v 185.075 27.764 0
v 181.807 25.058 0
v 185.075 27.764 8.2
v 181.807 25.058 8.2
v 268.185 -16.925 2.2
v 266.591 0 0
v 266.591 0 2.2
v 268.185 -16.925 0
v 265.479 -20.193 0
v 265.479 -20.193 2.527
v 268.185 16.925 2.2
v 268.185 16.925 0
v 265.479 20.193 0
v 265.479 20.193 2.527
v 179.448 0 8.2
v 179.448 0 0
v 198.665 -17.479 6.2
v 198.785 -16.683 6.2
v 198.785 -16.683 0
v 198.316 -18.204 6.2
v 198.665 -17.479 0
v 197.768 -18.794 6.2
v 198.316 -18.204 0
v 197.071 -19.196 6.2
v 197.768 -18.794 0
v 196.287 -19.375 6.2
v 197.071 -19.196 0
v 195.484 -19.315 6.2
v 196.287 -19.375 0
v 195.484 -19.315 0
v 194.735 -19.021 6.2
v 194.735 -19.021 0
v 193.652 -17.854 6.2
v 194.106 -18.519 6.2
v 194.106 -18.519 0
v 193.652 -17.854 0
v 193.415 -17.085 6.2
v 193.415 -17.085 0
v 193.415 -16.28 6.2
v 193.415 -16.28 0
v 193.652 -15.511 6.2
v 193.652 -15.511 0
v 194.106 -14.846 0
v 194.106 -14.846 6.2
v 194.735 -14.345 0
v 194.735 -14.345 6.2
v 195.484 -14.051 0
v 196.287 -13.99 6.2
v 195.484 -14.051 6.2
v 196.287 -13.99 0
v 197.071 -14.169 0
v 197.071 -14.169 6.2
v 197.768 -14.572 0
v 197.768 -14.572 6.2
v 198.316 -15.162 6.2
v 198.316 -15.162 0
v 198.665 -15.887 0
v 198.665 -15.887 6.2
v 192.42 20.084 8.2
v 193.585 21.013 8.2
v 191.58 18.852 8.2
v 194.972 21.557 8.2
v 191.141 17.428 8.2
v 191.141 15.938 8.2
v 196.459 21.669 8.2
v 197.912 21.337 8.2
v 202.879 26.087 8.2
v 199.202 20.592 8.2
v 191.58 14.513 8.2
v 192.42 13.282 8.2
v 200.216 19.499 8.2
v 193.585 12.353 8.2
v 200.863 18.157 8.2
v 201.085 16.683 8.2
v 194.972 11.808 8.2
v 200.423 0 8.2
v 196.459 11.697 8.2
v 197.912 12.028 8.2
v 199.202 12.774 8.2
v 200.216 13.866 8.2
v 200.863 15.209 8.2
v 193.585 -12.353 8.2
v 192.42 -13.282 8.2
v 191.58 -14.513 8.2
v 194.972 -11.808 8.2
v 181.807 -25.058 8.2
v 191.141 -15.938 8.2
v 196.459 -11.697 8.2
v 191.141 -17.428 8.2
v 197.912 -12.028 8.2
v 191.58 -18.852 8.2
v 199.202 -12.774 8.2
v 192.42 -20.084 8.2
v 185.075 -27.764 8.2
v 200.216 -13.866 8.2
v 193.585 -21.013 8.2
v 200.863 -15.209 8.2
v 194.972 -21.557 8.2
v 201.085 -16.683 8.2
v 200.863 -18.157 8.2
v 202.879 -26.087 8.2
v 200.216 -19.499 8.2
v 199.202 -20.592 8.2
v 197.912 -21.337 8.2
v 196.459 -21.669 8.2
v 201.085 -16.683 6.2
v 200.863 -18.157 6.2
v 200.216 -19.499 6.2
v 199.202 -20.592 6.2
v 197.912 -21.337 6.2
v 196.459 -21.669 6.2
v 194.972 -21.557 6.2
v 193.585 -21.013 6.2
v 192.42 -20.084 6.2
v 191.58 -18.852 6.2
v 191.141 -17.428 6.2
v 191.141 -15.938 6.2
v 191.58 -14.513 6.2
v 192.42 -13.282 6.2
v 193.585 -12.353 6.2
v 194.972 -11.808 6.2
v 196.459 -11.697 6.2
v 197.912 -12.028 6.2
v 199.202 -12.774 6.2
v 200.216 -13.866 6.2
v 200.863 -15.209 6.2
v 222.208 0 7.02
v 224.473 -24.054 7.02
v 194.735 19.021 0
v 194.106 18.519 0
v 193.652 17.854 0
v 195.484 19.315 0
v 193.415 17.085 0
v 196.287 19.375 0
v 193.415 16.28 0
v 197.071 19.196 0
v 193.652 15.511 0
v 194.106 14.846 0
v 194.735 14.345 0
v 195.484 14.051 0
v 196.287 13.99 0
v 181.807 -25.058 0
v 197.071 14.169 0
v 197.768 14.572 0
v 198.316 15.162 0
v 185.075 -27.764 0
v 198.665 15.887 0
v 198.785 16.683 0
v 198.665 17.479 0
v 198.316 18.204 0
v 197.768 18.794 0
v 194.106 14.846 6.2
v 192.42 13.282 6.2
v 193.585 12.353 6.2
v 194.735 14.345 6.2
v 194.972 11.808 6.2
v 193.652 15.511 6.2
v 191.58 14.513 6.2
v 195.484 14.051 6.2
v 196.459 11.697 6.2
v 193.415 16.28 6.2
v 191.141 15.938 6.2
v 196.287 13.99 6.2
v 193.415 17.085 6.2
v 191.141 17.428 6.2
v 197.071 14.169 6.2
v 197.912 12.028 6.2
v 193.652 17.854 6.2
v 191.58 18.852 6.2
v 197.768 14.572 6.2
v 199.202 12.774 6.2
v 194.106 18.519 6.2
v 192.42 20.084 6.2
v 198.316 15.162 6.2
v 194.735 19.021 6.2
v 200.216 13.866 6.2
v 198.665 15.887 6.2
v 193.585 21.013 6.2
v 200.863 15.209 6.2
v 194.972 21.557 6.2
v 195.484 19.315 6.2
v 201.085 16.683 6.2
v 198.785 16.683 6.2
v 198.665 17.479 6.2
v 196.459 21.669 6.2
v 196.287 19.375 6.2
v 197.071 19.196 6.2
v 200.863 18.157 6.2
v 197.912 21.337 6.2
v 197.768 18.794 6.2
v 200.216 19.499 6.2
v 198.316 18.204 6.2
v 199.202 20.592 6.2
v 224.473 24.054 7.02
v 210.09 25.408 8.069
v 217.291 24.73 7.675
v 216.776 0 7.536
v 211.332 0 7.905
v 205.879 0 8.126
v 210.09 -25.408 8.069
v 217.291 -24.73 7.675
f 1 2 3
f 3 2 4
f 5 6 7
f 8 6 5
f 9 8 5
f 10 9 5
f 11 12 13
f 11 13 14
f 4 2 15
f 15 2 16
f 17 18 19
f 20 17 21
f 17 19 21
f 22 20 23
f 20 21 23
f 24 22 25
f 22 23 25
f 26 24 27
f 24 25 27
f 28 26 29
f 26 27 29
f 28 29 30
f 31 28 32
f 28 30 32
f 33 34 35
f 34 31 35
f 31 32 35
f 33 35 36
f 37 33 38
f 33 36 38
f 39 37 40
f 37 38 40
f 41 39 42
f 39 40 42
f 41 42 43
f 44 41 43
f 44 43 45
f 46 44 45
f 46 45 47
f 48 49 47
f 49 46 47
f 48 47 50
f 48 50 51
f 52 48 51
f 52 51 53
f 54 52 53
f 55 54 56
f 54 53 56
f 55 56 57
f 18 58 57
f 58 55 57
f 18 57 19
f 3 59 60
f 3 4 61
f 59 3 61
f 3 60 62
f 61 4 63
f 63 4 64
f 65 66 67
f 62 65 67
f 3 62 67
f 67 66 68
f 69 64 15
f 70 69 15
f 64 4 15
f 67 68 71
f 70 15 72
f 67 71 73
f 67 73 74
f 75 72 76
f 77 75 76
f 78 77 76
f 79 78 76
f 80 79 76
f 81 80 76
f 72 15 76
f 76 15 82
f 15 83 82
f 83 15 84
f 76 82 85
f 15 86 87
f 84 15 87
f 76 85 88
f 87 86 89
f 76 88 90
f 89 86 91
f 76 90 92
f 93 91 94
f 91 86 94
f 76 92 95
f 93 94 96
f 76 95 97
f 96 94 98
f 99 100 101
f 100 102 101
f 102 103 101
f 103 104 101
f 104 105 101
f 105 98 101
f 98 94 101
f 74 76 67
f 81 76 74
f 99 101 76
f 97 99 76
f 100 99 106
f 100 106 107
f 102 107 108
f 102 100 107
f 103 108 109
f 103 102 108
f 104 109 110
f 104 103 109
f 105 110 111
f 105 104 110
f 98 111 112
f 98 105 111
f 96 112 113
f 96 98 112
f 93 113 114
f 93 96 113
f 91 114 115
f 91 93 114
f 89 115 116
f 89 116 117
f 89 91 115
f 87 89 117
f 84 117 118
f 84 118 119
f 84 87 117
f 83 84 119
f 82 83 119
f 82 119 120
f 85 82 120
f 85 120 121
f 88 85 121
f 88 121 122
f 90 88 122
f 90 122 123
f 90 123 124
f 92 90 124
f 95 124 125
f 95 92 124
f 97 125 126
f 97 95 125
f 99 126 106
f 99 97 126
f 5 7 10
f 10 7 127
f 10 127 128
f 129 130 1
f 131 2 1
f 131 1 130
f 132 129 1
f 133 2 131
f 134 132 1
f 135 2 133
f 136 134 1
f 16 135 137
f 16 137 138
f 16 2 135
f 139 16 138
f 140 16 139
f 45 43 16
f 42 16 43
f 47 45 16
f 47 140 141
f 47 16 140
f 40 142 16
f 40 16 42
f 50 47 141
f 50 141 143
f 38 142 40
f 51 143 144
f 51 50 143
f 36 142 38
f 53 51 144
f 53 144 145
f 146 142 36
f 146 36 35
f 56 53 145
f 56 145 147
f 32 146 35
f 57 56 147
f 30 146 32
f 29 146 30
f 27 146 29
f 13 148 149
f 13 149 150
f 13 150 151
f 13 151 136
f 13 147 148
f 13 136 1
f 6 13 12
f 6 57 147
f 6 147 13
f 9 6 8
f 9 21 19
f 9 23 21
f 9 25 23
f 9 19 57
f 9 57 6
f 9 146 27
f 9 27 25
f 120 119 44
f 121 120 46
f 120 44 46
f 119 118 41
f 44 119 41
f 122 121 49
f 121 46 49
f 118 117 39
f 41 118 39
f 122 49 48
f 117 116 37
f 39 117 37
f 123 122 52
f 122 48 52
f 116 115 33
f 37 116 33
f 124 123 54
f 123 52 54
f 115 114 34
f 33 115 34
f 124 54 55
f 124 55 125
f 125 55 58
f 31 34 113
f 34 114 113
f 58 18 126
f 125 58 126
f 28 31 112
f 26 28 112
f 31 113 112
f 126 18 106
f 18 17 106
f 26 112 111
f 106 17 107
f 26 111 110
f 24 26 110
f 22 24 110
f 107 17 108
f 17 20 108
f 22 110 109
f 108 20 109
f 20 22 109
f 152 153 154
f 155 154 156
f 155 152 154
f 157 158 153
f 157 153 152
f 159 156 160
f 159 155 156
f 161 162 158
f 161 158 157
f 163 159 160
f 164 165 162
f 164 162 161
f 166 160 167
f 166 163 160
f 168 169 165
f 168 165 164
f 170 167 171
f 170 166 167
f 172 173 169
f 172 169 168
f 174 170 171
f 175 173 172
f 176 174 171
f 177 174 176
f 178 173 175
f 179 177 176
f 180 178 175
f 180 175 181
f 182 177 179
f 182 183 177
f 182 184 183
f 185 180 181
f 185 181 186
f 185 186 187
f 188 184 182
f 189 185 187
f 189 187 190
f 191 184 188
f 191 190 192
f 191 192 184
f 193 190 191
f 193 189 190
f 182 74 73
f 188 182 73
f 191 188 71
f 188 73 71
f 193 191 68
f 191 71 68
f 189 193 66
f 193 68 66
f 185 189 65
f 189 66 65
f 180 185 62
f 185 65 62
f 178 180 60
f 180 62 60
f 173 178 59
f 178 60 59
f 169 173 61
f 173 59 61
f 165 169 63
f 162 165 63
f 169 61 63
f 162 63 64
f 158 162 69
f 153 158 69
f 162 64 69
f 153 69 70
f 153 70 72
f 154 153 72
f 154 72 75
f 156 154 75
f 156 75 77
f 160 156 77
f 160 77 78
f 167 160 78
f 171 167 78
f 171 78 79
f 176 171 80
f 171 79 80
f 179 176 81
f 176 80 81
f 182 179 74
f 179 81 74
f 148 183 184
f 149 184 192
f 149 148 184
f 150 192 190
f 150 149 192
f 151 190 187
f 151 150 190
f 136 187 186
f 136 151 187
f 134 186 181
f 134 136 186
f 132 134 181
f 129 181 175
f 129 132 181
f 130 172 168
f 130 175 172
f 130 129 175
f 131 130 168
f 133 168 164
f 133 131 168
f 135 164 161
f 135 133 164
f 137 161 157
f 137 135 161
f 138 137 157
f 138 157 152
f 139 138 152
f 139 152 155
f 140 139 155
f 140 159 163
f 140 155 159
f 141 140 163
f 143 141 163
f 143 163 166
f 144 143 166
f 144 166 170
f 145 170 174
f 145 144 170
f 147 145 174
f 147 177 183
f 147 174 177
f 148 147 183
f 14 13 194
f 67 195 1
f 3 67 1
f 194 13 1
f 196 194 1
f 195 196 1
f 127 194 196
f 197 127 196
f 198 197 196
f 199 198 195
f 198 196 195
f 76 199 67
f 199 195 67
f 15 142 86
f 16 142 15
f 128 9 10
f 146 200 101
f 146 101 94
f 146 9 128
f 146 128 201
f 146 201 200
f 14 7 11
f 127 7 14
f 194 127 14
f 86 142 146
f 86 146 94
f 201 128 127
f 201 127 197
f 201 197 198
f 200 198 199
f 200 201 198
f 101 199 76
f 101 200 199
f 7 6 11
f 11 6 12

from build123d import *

# Parameters (mm, degrees)
SKETCH004_R      = 2.7
PAD003_DEPTH     = 8.2
SKETCH005_R      = 5
POCKET001_DEPTH  = 2
CHAMFER002_SIZE  = 3
CHAMFER003_SIZE2 = 55
CHAMFER003_SIZE  = 6
FILLET_R         = 200
CHAMFER004_SIZE  = 3


with BuildPart() as part:
    # Sketch004 (on XY_Plane003 of Origin006) → Pad003 (new body)
    with BuildSketch(Plane.XY):
        Polygon((268.465729, 19.911931), (182.088478, 28.044908), (179.447869, 0), (266.590892, 0), align=None)
        with Locations((196.085008, 16.682815)):
            Circle(SKETCH004_R, mode=Mode.SUBTRACT)
    extrude(amount=PAD003_DEPTH)

    # Sketch005 (on Face7 of Pad003) → Pocket001 (cut)
    with BuildSketch(Plane.XY.offset(8.2)):
        with Locations((196.085008, 16.682815)):
            Circle(SKETCH005_R)
    extrude(amount=-POCKET001_DEPTH, mode=Mode.SUBTRACT)

    # Chamfer002
    chamfer002_edges = [part.edges().sort_by_distance(p)[0] for p in [
        (182.088478, 28.044908, 4.1),
    ]]
    chamfer(chamfer002_edges, length=CHAMFER002_SIZE)

    # Chamfer003
    chamfer003_edges = [part.edges().sort_by_distance(p)[0] for p in [
        (267.52831, 9.955965, 8.2),
    ]]
    chamfer003_side = part.faces().sort_by_distance((267.52831, 9.955965, 4.1))[0]
    chamfer(chamfer003_edges, length=CHAMFER003_SIZE, length2=CHAMFER003_SIZE2, reference=chamfer003_side)

    # Fillet
    fillet_edges = [part.edges().sort_by_distance(p)[0] for p in [
        (212.527775, 12.533867, 8.2),
    ]]
    fillet(fillet_edges, radius=FILLET_R)

    # Chamfer004
    chamfer004_edges = [part.edges().sort_by_distance(p)[0] for p in [
        (268.465729, 19.911931, 1.1),
    ]]
    chamfer(chamfer004_edges, length=CHAMFER004_SIZE)

    # Mirrored001: part across face of Chamfer004


with BuildPart() as part_1:
    add(part.part)
    add(part.part.mirror(Plane(origin=(215.438972, 0, 3.448187), x_dir=(1, 0, 0), z_dir=(0, -1, 0))))


solid = part_1.part
